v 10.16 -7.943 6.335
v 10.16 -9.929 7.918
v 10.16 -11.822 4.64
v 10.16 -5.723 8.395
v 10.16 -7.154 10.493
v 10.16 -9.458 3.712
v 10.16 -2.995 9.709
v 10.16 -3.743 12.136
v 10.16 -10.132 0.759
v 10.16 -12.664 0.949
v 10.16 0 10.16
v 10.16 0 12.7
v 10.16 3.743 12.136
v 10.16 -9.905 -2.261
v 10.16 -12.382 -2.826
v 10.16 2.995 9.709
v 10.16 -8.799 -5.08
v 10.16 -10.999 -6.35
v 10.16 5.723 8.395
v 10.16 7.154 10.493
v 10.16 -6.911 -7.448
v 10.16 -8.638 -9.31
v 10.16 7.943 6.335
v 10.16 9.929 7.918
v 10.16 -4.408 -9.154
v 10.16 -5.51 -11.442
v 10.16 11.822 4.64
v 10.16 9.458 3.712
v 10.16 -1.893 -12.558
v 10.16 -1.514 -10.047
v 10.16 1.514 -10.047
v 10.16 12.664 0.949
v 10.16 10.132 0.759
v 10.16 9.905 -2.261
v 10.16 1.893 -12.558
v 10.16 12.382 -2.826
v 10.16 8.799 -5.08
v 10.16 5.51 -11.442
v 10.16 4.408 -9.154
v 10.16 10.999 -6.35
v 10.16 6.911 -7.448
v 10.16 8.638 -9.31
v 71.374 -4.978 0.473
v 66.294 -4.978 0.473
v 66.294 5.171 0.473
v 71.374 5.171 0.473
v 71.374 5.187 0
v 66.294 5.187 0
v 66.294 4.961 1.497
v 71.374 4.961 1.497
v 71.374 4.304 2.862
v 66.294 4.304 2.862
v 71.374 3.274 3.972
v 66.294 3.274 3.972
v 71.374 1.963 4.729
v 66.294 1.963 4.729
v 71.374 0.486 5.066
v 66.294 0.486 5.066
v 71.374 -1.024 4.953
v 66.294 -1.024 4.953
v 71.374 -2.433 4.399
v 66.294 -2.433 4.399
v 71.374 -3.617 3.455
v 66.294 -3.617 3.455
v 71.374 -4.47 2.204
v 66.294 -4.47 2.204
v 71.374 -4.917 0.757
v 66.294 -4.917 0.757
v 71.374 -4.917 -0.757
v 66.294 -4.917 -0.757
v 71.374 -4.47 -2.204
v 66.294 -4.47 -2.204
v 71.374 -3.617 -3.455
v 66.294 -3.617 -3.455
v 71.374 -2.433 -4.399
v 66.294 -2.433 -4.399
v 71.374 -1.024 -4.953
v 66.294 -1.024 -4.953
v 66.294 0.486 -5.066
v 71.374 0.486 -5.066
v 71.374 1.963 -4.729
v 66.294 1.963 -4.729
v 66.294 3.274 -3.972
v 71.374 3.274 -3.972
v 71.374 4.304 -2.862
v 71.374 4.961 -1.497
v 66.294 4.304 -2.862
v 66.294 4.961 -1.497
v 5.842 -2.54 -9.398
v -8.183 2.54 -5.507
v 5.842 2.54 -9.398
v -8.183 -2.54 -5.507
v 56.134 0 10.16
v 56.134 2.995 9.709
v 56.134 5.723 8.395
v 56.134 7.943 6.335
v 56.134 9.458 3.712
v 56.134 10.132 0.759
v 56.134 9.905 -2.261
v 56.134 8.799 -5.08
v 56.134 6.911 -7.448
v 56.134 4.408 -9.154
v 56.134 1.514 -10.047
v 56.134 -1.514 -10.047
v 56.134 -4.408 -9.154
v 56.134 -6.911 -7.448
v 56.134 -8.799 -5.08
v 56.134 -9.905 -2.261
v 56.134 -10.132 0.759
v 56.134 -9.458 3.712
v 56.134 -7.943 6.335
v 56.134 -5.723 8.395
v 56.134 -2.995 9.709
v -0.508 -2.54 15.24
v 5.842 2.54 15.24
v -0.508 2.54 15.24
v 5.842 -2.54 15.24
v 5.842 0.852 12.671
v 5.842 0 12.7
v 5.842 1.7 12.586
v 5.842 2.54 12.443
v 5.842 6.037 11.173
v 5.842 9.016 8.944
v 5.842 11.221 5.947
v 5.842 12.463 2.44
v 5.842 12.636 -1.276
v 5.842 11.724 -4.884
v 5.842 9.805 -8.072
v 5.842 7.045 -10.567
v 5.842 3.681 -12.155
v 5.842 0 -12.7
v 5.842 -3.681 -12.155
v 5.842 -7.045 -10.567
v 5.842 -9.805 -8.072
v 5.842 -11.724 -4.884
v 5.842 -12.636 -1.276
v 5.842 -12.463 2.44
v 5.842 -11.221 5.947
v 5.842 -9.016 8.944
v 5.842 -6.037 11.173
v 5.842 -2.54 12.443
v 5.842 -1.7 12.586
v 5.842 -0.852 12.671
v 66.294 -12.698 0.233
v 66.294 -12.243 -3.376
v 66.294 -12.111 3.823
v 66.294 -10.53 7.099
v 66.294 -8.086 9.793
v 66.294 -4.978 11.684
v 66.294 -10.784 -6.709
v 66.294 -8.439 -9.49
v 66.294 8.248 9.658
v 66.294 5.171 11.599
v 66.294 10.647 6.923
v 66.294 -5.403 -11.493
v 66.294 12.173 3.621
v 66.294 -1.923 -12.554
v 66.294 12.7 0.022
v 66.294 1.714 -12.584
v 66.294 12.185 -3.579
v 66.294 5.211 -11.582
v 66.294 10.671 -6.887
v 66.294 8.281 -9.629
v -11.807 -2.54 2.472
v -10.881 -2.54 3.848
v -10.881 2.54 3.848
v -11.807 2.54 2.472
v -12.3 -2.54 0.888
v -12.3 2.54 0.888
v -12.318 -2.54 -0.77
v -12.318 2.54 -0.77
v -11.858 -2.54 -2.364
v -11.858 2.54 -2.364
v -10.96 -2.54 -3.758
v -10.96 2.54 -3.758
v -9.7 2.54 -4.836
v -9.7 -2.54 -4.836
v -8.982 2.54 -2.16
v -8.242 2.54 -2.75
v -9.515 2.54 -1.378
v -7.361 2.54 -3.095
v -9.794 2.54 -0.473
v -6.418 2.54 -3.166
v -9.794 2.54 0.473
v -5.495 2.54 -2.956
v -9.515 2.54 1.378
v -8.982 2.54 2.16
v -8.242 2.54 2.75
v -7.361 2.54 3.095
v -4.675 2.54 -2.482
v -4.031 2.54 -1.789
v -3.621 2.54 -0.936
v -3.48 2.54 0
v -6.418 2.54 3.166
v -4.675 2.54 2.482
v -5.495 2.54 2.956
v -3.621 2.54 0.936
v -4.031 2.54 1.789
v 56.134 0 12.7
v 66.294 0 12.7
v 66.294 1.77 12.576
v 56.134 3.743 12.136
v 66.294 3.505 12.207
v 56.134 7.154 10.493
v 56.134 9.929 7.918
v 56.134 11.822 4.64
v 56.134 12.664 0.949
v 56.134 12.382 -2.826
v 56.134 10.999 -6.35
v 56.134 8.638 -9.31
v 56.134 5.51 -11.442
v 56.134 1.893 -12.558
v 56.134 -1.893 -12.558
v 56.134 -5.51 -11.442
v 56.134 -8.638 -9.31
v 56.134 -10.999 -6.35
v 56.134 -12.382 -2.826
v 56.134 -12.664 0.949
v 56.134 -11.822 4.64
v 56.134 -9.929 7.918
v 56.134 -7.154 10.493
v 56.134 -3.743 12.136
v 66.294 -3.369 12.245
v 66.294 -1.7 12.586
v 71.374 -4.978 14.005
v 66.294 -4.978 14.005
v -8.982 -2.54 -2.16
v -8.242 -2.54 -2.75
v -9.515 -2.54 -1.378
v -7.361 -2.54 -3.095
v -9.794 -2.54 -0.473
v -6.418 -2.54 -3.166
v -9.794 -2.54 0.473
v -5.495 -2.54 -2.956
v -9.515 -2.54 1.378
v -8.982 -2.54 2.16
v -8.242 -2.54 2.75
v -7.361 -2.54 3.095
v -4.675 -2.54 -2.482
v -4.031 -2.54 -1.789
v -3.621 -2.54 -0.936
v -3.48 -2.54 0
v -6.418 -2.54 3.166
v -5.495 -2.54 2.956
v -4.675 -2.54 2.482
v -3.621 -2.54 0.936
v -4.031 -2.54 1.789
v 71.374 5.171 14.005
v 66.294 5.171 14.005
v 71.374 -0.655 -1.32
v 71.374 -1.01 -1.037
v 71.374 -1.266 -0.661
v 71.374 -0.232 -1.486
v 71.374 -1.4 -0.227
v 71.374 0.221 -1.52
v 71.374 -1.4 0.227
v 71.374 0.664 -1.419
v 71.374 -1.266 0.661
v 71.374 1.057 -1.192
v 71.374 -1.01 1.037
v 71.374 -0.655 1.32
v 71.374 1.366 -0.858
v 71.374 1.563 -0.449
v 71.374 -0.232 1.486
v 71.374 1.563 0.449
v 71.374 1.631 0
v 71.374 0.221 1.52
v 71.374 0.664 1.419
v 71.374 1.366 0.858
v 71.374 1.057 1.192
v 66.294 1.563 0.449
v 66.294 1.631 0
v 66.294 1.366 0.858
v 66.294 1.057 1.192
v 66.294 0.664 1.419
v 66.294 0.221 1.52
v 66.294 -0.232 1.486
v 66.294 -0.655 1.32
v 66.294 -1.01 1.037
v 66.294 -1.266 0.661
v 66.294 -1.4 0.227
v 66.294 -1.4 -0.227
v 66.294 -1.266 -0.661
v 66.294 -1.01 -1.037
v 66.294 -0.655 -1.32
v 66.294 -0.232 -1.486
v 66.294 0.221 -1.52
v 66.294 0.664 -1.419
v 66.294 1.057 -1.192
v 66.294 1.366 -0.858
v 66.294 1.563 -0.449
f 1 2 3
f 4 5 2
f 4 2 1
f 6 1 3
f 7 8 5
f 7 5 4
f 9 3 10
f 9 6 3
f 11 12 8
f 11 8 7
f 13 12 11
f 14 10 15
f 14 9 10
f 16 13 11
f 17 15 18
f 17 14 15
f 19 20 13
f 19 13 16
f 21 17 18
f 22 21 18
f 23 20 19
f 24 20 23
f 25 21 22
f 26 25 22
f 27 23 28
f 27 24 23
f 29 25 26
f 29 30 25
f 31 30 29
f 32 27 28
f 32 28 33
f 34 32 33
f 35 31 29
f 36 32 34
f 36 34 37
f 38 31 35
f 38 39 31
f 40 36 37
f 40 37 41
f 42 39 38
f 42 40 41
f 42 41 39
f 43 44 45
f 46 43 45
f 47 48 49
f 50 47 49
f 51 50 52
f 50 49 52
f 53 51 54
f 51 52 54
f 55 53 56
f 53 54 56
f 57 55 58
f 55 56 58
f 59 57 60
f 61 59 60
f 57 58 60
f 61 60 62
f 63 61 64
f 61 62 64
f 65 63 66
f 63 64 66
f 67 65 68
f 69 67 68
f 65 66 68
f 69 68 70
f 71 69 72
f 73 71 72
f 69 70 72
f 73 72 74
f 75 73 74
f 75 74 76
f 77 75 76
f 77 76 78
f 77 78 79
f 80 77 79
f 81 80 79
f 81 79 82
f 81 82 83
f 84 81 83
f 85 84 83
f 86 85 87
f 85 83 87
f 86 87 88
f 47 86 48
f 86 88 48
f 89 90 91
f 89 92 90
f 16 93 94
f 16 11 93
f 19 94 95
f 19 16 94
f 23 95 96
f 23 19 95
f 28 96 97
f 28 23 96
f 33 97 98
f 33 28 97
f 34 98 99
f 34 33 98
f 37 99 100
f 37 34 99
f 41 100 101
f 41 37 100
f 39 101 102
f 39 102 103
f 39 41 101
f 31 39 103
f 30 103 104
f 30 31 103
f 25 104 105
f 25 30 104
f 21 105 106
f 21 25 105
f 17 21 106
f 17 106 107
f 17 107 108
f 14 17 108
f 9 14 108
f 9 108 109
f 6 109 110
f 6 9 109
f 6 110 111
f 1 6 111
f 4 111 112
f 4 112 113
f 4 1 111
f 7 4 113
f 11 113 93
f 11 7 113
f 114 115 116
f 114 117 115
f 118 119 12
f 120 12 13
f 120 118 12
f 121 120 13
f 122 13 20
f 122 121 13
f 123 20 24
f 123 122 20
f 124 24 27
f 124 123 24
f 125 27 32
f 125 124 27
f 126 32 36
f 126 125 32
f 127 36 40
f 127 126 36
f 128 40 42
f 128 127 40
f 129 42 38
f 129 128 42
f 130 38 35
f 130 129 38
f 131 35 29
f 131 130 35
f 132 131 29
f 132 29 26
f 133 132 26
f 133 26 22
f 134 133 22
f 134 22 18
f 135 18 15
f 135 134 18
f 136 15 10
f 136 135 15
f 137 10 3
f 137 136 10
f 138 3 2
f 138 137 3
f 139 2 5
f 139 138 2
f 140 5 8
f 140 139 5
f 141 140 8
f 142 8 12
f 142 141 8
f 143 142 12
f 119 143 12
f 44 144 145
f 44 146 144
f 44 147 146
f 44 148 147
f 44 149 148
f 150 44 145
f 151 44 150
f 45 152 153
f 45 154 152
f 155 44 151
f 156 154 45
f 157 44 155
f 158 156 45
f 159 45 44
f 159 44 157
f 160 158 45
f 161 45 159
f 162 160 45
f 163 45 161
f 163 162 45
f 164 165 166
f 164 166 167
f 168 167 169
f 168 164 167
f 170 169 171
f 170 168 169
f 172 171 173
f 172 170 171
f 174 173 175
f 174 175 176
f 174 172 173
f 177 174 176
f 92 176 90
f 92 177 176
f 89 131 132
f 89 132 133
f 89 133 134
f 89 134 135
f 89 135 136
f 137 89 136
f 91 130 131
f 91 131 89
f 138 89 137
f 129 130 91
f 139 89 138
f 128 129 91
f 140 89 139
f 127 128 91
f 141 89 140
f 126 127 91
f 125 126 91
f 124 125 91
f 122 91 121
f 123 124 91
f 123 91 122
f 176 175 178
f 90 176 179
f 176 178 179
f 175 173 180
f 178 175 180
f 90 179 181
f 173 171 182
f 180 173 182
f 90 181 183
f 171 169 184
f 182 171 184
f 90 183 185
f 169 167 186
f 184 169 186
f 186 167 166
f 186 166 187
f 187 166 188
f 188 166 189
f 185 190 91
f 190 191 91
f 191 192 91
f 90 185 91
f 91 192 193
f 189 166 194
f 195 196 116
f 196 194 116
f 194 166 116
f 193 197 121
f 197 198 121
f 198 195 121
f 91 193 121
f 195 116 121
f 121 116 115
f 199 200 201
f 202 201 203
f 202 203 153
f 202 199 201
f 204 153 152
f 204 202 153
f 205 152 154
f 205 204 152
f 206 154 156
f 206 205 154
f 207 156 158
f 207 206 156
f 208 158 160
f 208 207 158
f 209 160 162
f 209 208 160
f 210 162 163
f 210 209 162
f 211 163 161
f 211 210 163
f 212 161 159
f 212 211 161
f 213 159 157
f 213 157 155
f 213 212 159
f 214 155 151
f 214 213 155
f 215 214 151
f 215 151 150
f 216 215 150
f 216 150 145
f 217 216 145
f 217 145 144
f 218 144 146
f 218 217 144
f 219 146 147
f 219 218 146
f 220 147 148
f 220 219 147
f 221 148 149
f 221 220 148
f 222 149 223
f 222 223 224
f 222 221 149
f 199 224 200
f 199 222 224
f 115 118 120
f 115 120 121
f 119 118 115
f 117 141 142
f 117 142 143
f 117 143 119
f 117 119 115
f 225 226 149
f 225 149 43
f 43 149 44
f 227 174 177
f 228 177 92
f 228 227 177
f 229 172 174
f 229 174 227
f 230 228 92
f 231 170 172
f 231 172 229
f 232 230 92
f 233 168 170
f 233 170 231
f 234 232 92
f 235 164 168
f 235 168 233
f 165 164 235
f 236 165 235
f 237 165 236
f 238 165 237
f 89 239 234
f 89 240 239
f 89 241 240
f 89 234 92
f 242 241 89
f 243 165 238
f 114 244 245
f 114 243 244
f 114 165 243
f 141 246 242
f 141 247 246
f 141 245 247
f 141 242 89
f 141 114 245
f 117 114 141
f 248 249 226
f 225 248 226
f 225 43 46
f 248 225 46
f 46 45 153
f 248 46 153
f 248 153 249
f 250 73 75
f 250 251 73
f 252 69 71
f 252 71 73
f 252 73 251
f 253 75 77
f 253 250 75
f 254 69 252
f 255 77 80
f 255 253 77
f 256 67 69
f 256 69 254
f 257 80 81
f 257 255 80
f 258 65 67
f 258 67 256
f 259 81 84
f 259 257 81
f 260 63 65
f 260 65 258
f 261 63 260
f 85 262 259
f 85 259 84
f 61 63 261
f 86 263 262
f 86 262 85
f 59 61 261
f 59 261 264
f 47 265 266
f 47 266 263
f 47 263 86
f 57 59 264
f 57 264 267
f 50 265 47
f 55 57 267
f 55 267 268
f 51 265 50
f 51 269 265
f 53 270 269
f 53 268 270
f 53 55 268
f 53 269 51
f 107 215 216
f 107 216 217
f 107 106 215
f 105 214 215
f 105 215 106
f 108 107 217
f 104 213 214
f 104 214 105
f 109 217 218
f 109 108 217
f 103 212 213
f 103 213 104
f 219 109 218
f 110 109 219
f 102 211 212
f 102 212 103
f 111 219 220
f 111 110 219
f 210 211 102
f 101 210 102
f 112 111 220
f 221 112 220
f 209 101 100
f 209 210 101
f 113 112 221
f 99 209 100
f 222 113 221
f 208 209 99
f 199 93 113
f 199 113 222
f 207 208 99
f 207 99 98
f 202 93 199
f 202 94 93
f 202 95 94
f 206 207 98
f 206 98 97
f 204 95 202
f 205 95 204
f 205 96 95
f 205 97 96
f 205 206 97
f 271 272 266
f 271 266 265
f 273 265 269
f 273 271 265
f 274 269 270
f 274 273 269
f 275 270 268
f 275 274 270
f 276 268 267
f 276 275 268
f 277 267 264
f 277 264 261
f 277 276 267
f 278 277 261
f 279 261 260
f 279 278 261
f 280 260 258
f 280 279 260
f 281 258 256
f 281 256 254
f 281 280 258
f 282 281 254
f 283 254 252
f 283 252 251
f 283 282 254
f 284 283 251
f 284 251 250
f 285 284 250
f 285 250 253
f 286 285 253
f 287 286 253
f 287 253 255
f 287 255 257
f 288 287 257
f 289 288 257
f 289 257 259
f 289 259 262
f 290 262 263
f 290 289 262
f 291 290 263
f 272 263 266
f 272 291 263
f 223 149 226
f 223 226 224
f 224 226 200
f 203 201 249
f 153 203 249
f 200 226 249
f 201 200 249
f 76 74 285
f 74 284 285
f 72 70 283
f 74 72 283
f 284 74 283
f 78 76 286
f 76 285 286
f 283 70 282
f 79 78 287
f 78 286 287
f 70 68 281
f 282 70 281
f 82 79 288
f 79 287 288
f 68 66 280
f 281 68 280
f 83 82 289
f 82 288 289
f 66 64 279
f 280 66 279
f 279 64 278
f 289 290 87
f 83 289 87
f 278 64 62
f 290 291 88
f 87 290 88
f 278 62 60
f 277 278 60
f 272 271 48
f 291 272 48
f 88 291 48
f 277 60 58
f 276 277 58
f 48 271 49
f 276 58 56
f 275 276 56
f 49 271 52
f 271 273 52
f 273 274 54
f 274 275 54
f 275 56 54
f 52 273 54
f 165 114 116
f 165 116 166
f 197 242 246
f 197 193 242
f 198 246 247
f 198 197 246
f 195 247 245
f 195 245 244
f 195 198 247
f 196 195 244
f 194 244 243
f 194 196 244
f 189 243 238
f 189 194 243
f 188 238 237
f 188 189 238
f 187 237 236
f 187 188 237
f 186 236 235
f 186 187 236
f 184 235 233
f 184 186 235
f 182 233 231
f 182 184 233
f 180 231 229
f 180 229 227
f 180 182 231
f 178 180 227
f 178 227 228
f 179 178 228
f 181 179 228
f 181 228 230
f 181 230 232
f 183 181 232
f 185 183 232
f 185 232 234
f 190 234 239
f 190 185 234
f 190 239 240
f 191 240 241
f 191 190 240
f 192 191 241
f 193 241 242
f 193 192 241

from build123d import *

# Parameters (mm, degrees)
F5_DEPTH = 5.08
F3_R     = 5.08
F3_R_2   = 1.524
F6_DEPTH = 5.08
F0_W     = 5.842
F0_H     = 12.7
F0_R     = 3.175
F7_DEPTH = 2.54


with BuildPart() as f1:
    # F0 (on Front) → F1 (revolve)
    with BuildSketch(Plane.XZ):
        Polygon((5.842, 12.7), (5.842, 0), (66.294, 0), (66.294, 12.7), (56.134, 12.7), (56.134, 10.16), (10.16, 10.16), (10.16, 12.7), align=None)
    revolve(axis=Axis((33.147, 0, 0), (-1, 0, 0)))

    # F4 (on face) → F5 (join)
    with BuildSketch(Plane.YZ.offset(66.294)):
        with BuildLine():
            Line((-4.978107, 11.683683), (-4.978107, 0.472536))
            Line((-4.978107, 0.472536), (5.171431, 0.472536))
            Line((5.171431, 0.472536), (5.171431, 11.599409))
            ThreePointArc((5.171431, 11.599409), (0.105447, 12.699562), (-4.978107, 11.683683))
        make_face()
        with BuildLine():
            Line((-4.978107, 14.005254), (-4.978107, 11.683683))
            ThreePointArc((-4.978107, 11.683683), (0.105447, 12.699562), (5.171431, 11.599409))
            Line((5.171431, 11.599409), (5.171431, 14.005254))
            Line((5.171431, 14.005254), (-4.978107, 14.005254))
        make_face()
    extrude(amount=F5_DEPTH)

    # F0 (on Front) → F7 (join, symmetric)
    with BuildSketch(Plane.XZ):
        with BuildLine():
            Line((-0.9398, 0), (0, 0))
            Line((0, 0), (0, 12.7))
            Line((0, 12.7), (5.842, 12.7))
            Line((5.842, 12.7), (5.842, 15.24))
            Line((5.842, 15.24), (-0.508, 15.24))
            Line((-0.508, 15.24), (-10.88063, 3.847543))
            ThreePointArc((-10.88063, 3.847543), (-4.591961, 5.329721), (-0.9398, 0))
        make_face()
        with Locations((2.921, 6.35)):
            Rectangle(F0_W, F0_H)
        with BuildLine():
            Line((5.842, 0), (0, 0))
            Line((0, 0), (-0.9398, 0))
            ThreePointArc((-0.9398, 0), (-3.195791, -4.549339), (-8.182663, -5.506983))
            Line((-8.182663, -5.506983), (5.842, -9.398))
            Line((5.842, -9.398), (5.842, 0))
        make_face()
        with BuildLine():
            ThreePointArc((-8.182663, -5.506983), (-3.195791, -4.549339), (-0.9398, 0))
            ThreePointArc((-0.9398, 0), (-4.591961, 5.329721), (-10.88063, 3.847543))
            ThreePointArc((-10.88063, 3.847543), (-12.145978, -1.583727), (-8.182663, -5.506983))
        make_face()
        with Locations((-6.6548, 0)):
            Circle(F0_R, mode=Mode.SUBTRACT)
    extrude(amount=F7_DEPTH, both=True)


with BuildPart() as f6:
    # F3 (on face) → F6 (new body)
    with BuildSketch(Plane.YZ.offset(66.294)):
        with Locations((0.106723, 0)):
            Circle(F3_R)
        with Locations((0.106723, 0)):
            Circle(F3_R_2, mode=Mode.SUBTRACT)
    extrude(amount=F6_DEPTH)


solid = Compound([f1.part, f6.part])
